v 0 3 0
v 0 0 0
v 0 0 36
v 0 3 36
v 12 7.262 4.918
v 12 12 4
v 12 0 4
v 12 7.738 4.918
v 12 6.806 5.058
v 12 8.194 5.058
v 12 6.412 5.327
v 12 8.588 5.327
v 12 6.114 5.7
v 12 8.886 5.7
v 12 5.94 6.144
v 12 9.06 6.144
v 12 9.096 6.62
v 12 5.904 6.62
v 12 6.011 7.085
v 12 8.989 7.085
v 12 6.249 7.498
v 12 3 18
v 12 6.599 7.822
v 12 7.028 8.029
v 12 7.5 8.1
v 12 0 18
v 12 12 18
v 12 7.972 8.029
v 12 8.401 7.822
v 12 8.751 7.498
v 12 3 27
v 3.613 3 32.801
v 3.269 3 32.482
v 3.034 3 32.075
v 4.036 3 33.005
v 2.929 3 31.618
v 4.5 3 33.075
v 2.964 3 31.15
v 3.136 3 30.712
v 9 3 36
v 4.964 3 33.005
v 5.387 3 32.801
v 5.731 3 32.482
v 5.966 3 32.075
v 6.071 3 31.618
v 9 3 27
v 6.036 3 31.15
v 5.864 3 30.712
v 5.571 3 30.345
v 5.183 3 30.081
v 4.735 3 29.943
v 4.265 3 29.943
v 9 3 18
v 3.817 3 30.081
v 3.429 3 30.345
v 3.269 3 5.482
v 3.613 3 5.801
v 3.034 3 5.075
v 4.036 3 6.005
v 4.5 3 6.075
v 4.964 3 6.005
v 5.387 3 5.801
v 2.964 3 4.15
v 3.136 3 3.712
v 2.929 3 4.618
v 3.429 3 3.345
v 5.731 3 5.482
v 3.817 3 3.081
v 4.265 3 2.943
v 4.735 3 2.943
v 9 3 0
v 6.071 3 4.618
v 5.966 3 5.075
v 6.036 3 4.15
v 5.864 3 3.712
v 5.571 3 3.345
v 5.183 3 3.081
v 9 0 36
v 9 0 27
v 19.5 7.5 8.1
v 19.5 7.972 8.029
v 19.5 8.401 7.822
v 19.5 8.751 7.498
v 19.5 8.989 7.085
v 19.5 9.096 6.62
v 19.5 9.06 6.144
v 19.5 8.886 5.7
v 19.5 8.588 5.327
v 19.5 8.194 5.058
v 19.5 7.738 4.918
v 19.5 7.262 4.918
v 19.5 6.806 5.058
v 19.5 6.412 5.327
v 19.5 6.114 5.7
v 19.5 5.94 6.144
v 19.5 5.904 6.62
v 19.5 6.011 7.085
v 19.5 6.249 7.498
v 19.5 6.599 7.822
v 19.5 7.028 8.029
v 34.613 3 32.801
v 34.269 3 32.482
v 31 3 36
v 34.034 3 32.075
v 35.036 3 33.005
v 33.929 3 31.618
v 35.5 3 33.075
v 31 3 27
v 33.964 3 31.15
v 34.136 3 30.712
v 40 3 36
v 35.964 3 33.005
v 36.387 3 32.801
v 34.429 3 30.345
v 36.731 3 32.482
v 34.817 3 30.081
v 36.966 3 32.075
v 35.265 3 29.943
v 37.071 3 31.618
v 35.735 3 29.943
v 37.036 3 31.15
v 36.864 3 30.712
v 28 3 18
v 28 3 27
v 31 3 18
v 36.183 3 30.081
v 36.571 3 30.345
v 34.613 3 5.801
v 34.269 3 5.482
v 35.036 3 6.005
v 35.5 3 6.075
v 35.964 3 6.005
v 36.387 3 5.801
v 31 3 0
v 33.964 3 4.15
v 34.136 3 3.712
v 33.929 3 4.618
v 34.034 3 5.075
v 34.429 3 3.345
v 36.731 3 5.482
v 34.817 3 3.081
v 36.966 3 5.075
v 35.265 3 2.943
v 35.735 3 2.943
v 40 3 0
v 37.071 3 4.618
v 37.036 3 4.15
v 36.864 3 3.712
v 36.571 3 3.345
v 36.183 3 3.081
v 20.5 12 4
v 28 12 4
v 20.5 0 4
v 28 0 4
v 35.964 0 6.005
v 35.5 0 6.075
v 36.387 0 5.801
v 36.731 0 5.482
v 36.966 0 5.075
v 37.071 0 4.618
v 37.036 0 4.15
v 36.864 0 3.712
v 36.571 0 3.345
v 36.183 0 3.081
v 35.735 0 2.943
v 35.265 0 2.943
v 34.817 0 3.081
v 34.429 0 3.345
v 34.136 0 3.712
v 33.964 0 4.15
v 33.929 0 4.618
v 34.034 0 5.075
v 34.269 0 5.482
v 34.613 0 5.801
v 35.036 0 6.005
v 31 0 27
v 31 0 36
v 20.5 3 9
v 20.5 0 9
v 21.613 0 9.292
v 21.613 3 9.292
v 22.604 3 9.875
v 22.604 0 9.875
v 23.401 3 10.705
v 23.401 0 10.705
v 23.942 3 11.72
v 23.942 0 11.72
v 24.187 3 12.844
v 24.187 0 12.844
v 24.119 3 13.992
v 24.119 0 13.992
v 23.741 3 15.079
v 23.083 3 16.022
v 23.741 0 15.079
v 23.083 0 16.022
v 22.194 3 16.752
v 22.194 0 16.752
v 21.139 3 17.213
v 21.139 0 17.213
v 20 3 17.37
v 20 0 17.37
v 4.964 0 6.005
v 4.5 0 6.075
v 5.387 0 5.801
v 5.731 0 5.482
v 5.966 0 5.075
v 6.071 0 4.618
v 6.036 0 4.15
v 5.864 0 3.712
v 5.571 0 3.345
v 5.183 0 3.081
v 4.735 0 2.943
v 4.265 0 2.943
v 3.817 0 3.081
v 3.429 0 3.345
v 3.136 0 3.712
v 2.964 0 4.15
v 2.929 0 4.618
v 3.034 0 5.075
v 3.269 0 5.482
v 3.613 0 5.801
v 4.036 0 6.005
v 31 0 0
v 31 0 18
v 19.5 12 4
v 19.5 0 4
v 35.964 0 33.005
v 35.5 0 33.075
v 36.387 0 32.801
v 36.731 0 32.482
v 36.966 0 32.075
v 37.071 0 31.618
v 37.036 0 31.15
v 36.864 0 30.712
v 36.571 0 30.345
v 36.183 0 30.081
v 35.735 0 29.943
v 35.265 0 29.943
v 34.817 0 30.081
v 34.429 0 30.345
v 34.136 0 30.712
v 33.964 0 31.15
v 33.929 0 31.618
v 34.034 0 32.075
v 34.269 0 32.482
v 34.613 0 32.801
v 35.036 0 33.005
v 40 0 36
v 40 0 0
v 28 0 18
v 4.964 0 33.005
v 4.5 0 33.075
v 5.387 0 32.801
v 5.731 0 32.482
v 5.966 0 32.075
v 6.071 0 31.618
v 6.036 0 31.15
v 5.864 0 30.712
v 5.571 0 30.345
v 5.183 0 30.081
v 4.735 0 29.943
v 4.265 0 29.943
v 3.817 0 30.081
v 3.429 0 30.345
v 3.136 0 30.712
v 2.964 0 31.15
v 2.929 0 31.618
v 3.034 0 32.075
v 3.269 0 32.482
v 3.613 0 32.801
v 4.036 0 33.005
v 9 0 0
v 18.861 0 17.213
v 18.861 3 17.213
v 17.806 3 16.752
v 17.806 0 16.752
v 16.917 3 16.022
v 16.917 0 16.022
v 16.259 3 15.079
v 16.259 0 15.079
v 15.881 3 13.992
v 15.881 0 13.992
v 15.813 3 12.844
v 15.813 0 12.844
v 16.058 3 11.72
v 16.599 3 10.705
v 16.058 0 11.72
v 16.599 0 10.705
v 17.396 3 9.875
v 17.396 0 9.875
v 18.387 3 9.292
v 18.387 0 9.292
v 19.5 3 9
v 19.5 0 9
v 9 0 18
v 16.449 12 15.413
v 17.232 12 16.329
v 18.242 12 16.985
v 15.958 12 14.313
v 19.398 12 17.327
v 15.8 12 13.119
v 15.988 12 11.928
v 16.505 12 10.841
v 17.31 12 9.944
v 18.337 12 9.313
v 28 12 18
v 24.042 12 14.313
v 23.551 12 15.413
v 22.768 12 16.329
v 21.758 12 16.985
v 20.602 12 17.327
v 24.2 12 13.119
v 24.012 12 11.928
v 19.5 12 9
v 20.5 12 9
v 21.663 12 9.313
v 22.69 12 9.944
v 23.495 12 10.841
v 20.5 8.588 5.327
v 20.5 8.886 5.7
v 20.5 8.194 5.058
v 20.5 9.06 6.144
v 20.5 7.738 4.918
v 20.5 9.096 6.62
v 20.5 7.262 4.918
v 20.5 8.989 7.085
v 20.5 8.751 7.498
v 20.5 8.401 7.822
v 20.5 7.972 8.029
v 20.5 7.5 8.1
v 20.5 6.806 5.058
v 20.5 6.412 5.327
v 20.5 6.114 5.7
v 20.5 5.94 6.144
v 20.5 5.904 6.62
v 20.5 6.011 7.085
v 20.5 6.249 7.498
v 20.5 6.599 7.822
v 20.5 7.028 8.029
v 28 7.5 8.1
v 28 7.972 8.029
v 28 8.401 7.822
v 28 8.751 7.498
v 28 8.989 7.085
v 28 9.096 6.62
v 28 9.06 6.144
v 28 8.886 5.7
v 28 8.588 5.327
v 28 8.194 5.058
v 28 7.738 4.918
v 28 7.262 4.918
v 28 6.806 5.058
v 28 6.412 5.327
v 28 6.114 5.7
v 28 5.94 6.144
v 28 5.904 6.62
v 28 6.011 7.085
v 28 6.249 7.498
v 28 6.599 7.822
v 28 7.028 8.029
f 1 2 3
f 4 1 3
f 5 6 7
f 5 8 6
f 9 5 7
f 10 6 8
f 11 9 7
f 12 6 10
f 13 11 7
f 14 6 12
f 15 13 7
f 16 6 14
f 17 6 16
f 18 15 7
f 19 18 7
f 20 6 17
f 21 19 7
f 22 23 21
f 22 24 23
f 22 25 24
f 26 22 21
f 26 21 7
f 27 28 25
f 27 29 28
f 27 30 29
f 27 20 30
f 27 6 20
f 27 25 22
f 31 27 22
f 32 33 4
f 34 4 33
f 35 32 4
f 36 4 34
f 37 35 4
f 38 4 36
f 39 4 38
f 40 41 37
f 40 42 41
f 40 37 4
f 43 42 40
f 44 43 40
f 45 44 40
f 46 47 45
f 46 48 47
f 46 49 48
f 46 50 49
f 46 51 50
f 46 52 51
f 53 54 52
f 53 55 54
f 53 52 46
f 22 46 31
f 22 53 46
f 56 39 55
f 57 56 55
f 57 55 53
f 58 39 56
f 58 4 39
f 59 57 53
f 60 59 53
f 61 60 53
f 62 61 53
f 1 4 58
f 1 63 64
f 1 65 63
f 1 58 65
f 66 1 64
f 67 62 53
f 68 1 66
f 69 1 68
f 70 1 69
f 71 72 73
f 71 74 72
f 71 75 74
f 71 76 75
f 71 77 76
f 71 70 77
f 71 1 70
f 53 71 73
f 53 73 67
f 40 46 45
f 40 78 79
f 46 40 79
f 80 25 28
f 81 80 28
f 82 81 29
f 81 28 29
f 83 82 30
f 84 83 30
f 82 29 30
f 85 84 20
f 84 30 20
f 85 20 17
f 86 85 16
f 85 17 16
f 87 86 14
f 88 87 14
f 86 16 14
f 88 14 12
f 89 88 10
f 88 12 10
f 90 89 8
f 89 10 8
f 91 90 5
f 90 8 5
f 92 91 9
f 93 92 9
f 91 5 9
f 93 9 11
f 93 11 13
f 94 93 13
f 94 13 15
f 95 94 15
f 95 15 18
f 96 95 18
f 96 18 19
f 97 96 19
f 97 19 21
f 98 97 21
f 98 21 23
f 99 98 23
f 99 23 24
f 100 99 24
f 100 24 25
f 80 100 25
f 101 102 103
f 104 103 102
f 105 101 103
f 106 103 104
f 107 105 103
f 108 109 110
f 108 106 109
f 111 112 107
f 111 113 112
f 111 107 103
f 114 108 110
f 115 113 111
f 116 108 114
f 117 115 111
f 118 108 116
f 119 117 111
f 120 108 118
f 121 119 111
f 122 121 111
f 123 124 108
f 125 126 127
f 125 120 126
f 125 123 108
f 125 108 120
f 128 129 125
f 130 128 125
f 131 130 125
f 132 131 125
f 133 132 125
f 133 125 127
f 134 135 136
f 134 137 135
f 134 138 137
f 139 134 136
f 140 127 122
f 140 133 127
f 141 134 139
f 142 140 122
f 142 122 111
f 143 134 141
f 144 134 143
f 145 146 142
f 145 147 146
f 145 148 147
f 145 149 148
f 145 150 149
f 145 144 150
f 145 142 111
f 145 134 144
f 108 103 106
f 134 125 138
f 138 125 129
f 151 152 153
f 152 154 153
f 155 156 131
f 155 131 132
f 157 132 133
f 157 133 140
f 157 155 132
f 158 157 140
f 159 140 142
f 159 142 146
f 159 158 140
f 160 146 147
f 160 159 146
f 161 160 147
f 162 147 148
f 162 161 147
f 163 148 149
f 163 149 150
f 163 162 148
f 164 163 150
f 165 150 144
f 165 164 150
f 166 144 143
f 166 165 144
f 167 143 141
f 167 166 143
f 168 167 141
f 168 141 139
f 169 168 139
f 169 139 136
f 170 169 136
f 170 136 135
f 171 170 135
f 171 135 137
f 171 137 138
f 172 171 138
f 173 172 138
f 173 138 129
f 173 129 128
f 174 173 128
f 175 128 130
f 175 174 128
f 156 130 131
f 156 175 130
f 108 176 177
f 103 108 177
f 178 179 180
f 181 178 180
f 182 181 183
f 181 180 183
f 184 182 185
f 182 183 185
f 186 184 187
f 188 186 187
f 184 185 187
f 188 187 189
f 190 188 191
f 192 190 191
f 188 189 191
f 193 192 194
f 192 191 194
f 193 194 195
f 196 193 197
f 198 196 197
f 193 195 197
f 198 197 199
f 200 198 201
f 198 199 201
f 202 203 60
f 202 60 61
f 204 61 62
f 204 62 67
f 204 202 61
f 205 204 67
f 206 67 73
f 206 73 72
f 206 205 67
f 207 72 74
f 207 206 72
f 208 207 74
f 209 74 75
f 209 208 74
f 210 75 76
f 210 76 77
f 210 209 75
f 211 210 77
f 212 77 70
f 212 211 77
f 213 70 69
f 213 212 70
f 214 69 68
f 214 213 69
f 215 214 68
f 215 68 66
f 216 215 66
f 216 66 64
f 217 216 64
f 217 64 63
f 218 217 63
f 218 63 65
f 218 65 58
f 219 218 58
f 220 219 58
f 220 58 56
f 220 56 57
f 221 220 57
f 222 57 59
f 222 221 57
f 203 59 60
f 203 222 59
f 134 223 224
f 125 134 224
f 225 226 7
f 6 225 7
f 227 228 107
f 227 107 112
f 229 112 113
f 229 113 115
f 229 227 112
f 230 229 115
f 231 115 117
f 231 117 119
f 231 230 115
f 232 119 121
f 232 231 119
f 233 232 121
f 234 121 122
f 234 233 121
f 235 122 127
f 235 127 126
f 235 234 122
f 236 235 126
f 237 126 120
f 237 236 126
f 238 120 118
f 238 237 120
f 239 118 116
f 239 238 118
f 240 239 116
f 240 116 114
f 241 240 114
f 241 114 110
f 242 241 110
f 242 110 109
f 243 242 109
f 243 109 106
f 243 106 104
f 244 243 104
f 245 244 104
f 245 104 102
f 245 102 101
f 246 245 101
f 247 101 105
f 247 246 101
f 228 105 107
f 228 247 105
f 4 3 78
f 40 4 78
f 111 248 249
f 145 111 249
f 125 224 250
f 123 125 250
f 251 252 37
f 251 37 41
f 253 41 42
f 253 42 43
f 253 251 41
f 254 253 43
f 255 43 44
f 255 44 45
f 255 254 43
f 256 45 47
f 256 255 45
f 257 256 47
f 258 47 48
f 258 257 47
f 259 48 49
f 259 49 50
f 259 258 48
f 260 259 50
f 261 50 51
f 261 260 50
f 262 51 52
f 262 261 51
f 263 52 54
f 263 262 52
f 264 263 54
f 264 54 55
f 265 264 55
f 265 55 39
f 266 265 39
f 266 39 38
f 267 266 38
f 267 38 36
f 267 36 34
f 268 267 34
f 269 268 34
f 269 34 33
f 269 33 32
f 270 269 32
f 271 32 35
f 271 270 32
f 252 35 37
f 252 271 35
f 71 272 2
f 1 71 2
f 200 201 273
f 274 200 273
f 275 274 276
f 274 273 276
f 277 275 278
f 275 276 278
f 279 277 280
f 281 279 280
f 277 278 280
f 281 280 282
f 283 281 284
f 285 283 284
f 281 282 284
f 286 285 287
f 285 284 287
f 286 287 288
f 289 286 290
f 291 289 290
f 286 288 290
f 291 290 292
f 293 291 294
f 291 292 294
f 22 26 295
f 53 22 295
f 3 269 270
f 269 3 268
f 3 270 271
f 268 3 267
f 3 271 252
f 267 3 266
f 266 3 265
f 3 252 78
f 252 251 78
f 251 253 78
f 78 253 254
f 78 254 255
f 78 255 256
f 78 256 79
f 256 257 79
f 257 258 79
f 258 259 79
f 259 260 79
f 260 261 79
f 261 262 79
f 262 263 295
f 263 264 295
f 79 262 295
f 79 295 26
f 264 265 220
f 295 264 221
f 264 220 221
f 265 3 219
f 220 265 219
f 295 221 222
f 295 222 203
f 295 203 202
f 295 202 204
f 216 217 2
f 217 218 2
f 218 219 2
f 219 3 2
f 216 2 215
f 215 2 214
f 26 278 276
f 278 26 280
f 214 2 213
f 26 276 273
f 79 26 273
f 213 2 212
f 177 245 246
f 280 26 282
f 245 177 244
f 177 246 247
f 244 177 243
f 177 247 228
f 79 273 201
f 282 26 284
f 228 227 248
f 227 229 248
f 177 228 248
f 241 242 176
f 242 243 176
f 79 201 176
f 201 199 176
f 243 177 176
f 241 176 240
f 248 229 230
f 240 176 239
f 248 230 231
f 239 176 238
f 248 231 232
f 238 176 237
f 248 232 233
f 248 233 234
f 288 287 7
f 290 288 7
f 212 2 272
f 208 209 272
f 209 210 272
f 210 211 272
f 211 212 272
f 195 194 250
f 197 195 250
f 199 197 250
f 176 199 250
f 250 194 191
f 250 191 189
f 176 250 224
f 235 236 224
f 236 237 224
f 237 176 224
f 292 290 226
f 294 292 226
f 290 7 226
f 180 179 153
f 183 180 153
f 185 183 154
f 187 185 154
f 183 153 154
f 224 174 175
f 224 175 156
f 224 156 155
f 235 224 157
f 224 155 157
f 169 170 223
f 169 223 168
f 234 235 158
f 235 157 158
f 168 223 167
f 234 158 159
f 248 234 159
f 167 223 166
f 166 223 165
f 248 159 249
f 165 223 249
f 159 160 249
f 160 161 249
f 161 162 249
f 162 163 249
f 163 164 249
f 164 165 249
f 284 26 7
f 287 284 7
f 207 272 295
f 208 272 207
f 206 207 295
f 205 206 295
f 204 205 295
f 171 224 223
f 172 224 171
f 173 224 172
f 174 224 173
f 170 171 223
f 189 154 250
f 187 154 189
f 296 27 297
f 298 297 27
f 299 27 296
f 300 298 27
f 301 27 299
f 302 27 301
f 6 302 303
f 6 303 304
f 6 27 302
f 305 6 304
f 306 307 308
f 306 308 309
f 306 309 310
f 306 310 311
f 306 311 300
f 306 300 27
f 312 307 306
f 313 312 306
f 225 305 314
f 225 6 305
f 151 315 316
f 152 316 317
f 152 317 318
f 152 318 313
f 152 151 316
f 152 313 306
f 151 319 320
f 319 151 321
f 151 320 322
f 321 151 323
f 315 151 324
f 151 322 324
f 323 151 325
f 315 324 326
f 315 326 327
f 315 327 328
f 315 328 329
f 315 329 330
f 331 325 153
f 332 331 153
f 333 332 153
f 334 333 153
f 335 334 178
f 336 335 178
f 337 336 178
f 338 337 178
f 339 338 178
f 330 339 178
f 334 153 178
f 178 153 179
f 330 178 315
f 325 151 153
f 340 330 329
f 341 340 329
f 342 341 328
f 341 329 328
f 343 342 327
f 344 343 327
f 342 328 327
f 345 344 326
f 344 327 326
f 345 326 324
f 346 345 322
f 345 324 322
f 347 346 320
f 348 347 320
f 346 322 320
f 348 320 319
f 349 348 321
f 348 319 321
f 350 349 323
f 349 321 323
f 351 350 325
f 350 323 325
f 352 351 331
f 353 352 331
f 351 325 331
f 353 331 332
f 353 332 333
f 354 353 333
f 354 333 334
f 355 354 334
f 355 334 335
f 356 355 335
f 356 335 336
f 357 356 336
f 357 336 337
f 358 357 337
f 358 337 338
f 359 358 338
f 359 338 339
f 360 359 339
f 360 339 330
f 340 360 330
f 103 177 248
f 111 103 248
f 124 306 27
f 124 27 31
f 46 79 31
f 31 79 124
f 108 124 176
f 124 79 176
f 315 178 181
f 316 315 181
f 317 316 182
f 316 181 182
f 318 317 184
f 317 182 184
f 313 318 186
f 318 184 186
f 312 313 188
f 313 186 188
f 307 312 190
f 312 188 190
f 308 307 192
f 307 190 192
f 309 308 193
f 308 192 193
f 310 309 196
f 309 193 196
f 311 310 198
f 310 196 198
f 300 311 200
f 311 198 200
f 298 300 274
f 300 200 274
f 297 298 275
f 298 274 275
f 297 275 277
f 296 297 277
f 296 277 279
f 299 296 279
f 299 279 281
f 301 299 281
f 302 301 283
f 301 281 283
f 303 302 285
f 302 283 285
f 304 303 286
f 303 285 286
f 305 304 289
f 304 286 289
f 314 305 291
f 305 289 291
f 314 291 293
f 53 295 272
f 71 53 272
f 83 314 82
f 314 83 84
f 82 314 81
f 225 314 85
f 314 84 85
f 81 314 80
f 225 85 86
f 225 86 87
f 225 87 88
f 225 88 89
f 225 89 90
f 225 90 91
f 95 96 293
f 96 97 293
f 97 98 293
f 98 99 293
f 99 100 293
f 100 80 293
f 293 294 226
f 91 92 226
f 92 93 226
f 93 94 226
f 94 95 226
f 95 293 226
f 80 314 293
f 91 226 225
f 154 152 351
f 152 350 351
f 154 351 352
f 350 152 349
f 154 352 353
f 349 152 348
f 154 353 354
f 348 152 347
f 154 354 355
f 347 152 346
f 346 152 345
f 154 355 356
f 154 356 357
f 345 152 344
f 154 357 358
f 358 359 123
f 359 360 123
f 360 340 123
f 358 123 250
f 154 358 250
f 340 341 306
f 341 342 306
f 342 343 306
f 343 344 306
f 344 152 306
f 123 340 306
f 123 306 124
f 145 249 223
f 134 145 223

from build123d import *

# Parameters (mm, degrees)
SKETCH2_R           = 1.575
BOSS_EXTRUDE4_DEPTH = 3
BOSS_EXTRUDE5_DEPTH = 9
RIB2_REACH          = 44.895
SKETCH8_WALL_W      = 100.51836442
SKETCH8_WALL_H      = 16
SKETCH9_R           = 1.6
CUT_EXTRUDE1_DEPTH  = 48.15930449


with BuildPart() as part:
    # Sketch2 → Boss-Extrude4 (new body)
    # profile 1 of 4: a face of its own
    with BuildSketch(Plane(origin=(0, 0, 0), x_dir=(1, 0, 0), z_dir=(0, 1, 0))):
        Polygon((28, -18), (20, -18), (20, -27), (31, -27), (31, -36), (40, -36), (40, 0), (31, 0), (31, -18), align=None)
        with Locations(Location((35.5, -31.5, 0), (0, 0, 270))):
            Circle(SKETCH2_R, mode=Mode.SUBTRACT)
        with Locations(Location((35.5, -4.5, 0), (0, 0, 270))):
            Circle(SKETCH2_R, mode=Mode.SUBTRACT)
    # profile 2 of 4: a face of its own
    with BuildSketch(Plane(origin=(0, 0, 0), x_dir=(1, 0, 0), z_dir=(0, 1, 0))):
        Polygon((9, 0), (0, 0), (0, -36), (9, -36), (9, -27), (20, -27), (20, -18), (12, -18), (9, -18), align=None)
        with Locations(Location((4.5, -31.5, 0), (0, 0, 270))):
            Circle(SKETCH2_R, mode=Mode.SUBTRACT)
        with Locations(Location((4.5, -4.5, 0), (0, 0, 270))):
            Circle(SKETCH2_R, mode=Mode.SUBTRACT)
    # profile 3 of 4: a face of its own
    with BuildSketch(Plane(origin=(0, 0, 0), x_dir=(1, 0, 0), z_dir=(0, 1, 0))):
        with BuildLine():
            Line((20, -17.370131892), (20, -18))
            Line((20, -18), (28, -18))
            Line((28, -18), (28, -4))
            Line((28, -4), (20.5, -4))
            Line((20.5, -4), (20.5, -9))
            ThreePointArc((20.5, -9), (24.192526324, -13.420577547), (20, -17.370131892))
        make_face()
    # profile 4 of 4: a face of its own
    with BuildSketch(Plane(origin=(0, 0, 0), x_dir=(1, 0, 0), z_dir=(0, 1, 0))):
        with BuildLine():
            Line((12, -4), (12, -18))
            Line((12, -18), (20, -18))
            Line((20, -18), (20, -17.370131892))
            ThreePointArc((20, -17.370131892), (15.807473676, -13.420577547), (19.5, -9))
            Line((19.5, -9), (19.5, -4))
            Line((19.5, -4), (12, -4))
        make_face()
    extrude(amount=BOSS_EXTRUDE4_DEPTH)

    # Sketch6 → Boss-Extrude5 (add)
    with BuildSketch(Plane(origin=(0, 3, 0), x_dir=(1, 0, 0), z_dir=(0, 1, 0))):
        with BuildLine():
            Line((12, -18), (28, -18))
            Line((28, -18), (28, -4))
            Line((28, -4), (20.5, -4))
            Line((20.5, -4), (20.5, -9))
            ThreePointArc((20.5, -9), (20, -17.370131892), (19.5, -9))
            Line((19.5, -9), (19.5, -4))
            Line((19.5, -4), (12, -4))
            Line((12, -4), (12, -18))
        make_face()
    extrude(amount=BOSS_EXTRUDE5_DEPTH)

    # Sketch8 wall → Rib2 (add, up to next)
    with BuildSketch(Plane(origin=(20, 7.5, 22.5), x_dir=(0, -0.707106781187, 0.707106781187), z_dir=(0, 0.707106781187, 0.707106781187)), mode=Mode.PRIVATE) as rib2_sk1:
        Rectangle(SKETCH8_WALL_W, SKETCH8_WALL_H)
    rib2_tool1 = extrude(rib2_sk1.sketch, amount=-RIB2_REACH, mode=Mode.PRIVATE) - part.part
    add(rib2_tool1.solids().sort_by_distance((20, 7.5, 22.5))[0])

    # Sketch9 → Cut-Extrude1 (cut, through all)
    with BuildSketch(Plane.ZY.offset(-12)):
        with Locations((6.5, 7.5)):
            Circle(SKETCH9_R)
    extrude(amount=-CUT_EXTRUDE1_DEPTH, mode=Mode.SUBTRACT)


solid = part.part
